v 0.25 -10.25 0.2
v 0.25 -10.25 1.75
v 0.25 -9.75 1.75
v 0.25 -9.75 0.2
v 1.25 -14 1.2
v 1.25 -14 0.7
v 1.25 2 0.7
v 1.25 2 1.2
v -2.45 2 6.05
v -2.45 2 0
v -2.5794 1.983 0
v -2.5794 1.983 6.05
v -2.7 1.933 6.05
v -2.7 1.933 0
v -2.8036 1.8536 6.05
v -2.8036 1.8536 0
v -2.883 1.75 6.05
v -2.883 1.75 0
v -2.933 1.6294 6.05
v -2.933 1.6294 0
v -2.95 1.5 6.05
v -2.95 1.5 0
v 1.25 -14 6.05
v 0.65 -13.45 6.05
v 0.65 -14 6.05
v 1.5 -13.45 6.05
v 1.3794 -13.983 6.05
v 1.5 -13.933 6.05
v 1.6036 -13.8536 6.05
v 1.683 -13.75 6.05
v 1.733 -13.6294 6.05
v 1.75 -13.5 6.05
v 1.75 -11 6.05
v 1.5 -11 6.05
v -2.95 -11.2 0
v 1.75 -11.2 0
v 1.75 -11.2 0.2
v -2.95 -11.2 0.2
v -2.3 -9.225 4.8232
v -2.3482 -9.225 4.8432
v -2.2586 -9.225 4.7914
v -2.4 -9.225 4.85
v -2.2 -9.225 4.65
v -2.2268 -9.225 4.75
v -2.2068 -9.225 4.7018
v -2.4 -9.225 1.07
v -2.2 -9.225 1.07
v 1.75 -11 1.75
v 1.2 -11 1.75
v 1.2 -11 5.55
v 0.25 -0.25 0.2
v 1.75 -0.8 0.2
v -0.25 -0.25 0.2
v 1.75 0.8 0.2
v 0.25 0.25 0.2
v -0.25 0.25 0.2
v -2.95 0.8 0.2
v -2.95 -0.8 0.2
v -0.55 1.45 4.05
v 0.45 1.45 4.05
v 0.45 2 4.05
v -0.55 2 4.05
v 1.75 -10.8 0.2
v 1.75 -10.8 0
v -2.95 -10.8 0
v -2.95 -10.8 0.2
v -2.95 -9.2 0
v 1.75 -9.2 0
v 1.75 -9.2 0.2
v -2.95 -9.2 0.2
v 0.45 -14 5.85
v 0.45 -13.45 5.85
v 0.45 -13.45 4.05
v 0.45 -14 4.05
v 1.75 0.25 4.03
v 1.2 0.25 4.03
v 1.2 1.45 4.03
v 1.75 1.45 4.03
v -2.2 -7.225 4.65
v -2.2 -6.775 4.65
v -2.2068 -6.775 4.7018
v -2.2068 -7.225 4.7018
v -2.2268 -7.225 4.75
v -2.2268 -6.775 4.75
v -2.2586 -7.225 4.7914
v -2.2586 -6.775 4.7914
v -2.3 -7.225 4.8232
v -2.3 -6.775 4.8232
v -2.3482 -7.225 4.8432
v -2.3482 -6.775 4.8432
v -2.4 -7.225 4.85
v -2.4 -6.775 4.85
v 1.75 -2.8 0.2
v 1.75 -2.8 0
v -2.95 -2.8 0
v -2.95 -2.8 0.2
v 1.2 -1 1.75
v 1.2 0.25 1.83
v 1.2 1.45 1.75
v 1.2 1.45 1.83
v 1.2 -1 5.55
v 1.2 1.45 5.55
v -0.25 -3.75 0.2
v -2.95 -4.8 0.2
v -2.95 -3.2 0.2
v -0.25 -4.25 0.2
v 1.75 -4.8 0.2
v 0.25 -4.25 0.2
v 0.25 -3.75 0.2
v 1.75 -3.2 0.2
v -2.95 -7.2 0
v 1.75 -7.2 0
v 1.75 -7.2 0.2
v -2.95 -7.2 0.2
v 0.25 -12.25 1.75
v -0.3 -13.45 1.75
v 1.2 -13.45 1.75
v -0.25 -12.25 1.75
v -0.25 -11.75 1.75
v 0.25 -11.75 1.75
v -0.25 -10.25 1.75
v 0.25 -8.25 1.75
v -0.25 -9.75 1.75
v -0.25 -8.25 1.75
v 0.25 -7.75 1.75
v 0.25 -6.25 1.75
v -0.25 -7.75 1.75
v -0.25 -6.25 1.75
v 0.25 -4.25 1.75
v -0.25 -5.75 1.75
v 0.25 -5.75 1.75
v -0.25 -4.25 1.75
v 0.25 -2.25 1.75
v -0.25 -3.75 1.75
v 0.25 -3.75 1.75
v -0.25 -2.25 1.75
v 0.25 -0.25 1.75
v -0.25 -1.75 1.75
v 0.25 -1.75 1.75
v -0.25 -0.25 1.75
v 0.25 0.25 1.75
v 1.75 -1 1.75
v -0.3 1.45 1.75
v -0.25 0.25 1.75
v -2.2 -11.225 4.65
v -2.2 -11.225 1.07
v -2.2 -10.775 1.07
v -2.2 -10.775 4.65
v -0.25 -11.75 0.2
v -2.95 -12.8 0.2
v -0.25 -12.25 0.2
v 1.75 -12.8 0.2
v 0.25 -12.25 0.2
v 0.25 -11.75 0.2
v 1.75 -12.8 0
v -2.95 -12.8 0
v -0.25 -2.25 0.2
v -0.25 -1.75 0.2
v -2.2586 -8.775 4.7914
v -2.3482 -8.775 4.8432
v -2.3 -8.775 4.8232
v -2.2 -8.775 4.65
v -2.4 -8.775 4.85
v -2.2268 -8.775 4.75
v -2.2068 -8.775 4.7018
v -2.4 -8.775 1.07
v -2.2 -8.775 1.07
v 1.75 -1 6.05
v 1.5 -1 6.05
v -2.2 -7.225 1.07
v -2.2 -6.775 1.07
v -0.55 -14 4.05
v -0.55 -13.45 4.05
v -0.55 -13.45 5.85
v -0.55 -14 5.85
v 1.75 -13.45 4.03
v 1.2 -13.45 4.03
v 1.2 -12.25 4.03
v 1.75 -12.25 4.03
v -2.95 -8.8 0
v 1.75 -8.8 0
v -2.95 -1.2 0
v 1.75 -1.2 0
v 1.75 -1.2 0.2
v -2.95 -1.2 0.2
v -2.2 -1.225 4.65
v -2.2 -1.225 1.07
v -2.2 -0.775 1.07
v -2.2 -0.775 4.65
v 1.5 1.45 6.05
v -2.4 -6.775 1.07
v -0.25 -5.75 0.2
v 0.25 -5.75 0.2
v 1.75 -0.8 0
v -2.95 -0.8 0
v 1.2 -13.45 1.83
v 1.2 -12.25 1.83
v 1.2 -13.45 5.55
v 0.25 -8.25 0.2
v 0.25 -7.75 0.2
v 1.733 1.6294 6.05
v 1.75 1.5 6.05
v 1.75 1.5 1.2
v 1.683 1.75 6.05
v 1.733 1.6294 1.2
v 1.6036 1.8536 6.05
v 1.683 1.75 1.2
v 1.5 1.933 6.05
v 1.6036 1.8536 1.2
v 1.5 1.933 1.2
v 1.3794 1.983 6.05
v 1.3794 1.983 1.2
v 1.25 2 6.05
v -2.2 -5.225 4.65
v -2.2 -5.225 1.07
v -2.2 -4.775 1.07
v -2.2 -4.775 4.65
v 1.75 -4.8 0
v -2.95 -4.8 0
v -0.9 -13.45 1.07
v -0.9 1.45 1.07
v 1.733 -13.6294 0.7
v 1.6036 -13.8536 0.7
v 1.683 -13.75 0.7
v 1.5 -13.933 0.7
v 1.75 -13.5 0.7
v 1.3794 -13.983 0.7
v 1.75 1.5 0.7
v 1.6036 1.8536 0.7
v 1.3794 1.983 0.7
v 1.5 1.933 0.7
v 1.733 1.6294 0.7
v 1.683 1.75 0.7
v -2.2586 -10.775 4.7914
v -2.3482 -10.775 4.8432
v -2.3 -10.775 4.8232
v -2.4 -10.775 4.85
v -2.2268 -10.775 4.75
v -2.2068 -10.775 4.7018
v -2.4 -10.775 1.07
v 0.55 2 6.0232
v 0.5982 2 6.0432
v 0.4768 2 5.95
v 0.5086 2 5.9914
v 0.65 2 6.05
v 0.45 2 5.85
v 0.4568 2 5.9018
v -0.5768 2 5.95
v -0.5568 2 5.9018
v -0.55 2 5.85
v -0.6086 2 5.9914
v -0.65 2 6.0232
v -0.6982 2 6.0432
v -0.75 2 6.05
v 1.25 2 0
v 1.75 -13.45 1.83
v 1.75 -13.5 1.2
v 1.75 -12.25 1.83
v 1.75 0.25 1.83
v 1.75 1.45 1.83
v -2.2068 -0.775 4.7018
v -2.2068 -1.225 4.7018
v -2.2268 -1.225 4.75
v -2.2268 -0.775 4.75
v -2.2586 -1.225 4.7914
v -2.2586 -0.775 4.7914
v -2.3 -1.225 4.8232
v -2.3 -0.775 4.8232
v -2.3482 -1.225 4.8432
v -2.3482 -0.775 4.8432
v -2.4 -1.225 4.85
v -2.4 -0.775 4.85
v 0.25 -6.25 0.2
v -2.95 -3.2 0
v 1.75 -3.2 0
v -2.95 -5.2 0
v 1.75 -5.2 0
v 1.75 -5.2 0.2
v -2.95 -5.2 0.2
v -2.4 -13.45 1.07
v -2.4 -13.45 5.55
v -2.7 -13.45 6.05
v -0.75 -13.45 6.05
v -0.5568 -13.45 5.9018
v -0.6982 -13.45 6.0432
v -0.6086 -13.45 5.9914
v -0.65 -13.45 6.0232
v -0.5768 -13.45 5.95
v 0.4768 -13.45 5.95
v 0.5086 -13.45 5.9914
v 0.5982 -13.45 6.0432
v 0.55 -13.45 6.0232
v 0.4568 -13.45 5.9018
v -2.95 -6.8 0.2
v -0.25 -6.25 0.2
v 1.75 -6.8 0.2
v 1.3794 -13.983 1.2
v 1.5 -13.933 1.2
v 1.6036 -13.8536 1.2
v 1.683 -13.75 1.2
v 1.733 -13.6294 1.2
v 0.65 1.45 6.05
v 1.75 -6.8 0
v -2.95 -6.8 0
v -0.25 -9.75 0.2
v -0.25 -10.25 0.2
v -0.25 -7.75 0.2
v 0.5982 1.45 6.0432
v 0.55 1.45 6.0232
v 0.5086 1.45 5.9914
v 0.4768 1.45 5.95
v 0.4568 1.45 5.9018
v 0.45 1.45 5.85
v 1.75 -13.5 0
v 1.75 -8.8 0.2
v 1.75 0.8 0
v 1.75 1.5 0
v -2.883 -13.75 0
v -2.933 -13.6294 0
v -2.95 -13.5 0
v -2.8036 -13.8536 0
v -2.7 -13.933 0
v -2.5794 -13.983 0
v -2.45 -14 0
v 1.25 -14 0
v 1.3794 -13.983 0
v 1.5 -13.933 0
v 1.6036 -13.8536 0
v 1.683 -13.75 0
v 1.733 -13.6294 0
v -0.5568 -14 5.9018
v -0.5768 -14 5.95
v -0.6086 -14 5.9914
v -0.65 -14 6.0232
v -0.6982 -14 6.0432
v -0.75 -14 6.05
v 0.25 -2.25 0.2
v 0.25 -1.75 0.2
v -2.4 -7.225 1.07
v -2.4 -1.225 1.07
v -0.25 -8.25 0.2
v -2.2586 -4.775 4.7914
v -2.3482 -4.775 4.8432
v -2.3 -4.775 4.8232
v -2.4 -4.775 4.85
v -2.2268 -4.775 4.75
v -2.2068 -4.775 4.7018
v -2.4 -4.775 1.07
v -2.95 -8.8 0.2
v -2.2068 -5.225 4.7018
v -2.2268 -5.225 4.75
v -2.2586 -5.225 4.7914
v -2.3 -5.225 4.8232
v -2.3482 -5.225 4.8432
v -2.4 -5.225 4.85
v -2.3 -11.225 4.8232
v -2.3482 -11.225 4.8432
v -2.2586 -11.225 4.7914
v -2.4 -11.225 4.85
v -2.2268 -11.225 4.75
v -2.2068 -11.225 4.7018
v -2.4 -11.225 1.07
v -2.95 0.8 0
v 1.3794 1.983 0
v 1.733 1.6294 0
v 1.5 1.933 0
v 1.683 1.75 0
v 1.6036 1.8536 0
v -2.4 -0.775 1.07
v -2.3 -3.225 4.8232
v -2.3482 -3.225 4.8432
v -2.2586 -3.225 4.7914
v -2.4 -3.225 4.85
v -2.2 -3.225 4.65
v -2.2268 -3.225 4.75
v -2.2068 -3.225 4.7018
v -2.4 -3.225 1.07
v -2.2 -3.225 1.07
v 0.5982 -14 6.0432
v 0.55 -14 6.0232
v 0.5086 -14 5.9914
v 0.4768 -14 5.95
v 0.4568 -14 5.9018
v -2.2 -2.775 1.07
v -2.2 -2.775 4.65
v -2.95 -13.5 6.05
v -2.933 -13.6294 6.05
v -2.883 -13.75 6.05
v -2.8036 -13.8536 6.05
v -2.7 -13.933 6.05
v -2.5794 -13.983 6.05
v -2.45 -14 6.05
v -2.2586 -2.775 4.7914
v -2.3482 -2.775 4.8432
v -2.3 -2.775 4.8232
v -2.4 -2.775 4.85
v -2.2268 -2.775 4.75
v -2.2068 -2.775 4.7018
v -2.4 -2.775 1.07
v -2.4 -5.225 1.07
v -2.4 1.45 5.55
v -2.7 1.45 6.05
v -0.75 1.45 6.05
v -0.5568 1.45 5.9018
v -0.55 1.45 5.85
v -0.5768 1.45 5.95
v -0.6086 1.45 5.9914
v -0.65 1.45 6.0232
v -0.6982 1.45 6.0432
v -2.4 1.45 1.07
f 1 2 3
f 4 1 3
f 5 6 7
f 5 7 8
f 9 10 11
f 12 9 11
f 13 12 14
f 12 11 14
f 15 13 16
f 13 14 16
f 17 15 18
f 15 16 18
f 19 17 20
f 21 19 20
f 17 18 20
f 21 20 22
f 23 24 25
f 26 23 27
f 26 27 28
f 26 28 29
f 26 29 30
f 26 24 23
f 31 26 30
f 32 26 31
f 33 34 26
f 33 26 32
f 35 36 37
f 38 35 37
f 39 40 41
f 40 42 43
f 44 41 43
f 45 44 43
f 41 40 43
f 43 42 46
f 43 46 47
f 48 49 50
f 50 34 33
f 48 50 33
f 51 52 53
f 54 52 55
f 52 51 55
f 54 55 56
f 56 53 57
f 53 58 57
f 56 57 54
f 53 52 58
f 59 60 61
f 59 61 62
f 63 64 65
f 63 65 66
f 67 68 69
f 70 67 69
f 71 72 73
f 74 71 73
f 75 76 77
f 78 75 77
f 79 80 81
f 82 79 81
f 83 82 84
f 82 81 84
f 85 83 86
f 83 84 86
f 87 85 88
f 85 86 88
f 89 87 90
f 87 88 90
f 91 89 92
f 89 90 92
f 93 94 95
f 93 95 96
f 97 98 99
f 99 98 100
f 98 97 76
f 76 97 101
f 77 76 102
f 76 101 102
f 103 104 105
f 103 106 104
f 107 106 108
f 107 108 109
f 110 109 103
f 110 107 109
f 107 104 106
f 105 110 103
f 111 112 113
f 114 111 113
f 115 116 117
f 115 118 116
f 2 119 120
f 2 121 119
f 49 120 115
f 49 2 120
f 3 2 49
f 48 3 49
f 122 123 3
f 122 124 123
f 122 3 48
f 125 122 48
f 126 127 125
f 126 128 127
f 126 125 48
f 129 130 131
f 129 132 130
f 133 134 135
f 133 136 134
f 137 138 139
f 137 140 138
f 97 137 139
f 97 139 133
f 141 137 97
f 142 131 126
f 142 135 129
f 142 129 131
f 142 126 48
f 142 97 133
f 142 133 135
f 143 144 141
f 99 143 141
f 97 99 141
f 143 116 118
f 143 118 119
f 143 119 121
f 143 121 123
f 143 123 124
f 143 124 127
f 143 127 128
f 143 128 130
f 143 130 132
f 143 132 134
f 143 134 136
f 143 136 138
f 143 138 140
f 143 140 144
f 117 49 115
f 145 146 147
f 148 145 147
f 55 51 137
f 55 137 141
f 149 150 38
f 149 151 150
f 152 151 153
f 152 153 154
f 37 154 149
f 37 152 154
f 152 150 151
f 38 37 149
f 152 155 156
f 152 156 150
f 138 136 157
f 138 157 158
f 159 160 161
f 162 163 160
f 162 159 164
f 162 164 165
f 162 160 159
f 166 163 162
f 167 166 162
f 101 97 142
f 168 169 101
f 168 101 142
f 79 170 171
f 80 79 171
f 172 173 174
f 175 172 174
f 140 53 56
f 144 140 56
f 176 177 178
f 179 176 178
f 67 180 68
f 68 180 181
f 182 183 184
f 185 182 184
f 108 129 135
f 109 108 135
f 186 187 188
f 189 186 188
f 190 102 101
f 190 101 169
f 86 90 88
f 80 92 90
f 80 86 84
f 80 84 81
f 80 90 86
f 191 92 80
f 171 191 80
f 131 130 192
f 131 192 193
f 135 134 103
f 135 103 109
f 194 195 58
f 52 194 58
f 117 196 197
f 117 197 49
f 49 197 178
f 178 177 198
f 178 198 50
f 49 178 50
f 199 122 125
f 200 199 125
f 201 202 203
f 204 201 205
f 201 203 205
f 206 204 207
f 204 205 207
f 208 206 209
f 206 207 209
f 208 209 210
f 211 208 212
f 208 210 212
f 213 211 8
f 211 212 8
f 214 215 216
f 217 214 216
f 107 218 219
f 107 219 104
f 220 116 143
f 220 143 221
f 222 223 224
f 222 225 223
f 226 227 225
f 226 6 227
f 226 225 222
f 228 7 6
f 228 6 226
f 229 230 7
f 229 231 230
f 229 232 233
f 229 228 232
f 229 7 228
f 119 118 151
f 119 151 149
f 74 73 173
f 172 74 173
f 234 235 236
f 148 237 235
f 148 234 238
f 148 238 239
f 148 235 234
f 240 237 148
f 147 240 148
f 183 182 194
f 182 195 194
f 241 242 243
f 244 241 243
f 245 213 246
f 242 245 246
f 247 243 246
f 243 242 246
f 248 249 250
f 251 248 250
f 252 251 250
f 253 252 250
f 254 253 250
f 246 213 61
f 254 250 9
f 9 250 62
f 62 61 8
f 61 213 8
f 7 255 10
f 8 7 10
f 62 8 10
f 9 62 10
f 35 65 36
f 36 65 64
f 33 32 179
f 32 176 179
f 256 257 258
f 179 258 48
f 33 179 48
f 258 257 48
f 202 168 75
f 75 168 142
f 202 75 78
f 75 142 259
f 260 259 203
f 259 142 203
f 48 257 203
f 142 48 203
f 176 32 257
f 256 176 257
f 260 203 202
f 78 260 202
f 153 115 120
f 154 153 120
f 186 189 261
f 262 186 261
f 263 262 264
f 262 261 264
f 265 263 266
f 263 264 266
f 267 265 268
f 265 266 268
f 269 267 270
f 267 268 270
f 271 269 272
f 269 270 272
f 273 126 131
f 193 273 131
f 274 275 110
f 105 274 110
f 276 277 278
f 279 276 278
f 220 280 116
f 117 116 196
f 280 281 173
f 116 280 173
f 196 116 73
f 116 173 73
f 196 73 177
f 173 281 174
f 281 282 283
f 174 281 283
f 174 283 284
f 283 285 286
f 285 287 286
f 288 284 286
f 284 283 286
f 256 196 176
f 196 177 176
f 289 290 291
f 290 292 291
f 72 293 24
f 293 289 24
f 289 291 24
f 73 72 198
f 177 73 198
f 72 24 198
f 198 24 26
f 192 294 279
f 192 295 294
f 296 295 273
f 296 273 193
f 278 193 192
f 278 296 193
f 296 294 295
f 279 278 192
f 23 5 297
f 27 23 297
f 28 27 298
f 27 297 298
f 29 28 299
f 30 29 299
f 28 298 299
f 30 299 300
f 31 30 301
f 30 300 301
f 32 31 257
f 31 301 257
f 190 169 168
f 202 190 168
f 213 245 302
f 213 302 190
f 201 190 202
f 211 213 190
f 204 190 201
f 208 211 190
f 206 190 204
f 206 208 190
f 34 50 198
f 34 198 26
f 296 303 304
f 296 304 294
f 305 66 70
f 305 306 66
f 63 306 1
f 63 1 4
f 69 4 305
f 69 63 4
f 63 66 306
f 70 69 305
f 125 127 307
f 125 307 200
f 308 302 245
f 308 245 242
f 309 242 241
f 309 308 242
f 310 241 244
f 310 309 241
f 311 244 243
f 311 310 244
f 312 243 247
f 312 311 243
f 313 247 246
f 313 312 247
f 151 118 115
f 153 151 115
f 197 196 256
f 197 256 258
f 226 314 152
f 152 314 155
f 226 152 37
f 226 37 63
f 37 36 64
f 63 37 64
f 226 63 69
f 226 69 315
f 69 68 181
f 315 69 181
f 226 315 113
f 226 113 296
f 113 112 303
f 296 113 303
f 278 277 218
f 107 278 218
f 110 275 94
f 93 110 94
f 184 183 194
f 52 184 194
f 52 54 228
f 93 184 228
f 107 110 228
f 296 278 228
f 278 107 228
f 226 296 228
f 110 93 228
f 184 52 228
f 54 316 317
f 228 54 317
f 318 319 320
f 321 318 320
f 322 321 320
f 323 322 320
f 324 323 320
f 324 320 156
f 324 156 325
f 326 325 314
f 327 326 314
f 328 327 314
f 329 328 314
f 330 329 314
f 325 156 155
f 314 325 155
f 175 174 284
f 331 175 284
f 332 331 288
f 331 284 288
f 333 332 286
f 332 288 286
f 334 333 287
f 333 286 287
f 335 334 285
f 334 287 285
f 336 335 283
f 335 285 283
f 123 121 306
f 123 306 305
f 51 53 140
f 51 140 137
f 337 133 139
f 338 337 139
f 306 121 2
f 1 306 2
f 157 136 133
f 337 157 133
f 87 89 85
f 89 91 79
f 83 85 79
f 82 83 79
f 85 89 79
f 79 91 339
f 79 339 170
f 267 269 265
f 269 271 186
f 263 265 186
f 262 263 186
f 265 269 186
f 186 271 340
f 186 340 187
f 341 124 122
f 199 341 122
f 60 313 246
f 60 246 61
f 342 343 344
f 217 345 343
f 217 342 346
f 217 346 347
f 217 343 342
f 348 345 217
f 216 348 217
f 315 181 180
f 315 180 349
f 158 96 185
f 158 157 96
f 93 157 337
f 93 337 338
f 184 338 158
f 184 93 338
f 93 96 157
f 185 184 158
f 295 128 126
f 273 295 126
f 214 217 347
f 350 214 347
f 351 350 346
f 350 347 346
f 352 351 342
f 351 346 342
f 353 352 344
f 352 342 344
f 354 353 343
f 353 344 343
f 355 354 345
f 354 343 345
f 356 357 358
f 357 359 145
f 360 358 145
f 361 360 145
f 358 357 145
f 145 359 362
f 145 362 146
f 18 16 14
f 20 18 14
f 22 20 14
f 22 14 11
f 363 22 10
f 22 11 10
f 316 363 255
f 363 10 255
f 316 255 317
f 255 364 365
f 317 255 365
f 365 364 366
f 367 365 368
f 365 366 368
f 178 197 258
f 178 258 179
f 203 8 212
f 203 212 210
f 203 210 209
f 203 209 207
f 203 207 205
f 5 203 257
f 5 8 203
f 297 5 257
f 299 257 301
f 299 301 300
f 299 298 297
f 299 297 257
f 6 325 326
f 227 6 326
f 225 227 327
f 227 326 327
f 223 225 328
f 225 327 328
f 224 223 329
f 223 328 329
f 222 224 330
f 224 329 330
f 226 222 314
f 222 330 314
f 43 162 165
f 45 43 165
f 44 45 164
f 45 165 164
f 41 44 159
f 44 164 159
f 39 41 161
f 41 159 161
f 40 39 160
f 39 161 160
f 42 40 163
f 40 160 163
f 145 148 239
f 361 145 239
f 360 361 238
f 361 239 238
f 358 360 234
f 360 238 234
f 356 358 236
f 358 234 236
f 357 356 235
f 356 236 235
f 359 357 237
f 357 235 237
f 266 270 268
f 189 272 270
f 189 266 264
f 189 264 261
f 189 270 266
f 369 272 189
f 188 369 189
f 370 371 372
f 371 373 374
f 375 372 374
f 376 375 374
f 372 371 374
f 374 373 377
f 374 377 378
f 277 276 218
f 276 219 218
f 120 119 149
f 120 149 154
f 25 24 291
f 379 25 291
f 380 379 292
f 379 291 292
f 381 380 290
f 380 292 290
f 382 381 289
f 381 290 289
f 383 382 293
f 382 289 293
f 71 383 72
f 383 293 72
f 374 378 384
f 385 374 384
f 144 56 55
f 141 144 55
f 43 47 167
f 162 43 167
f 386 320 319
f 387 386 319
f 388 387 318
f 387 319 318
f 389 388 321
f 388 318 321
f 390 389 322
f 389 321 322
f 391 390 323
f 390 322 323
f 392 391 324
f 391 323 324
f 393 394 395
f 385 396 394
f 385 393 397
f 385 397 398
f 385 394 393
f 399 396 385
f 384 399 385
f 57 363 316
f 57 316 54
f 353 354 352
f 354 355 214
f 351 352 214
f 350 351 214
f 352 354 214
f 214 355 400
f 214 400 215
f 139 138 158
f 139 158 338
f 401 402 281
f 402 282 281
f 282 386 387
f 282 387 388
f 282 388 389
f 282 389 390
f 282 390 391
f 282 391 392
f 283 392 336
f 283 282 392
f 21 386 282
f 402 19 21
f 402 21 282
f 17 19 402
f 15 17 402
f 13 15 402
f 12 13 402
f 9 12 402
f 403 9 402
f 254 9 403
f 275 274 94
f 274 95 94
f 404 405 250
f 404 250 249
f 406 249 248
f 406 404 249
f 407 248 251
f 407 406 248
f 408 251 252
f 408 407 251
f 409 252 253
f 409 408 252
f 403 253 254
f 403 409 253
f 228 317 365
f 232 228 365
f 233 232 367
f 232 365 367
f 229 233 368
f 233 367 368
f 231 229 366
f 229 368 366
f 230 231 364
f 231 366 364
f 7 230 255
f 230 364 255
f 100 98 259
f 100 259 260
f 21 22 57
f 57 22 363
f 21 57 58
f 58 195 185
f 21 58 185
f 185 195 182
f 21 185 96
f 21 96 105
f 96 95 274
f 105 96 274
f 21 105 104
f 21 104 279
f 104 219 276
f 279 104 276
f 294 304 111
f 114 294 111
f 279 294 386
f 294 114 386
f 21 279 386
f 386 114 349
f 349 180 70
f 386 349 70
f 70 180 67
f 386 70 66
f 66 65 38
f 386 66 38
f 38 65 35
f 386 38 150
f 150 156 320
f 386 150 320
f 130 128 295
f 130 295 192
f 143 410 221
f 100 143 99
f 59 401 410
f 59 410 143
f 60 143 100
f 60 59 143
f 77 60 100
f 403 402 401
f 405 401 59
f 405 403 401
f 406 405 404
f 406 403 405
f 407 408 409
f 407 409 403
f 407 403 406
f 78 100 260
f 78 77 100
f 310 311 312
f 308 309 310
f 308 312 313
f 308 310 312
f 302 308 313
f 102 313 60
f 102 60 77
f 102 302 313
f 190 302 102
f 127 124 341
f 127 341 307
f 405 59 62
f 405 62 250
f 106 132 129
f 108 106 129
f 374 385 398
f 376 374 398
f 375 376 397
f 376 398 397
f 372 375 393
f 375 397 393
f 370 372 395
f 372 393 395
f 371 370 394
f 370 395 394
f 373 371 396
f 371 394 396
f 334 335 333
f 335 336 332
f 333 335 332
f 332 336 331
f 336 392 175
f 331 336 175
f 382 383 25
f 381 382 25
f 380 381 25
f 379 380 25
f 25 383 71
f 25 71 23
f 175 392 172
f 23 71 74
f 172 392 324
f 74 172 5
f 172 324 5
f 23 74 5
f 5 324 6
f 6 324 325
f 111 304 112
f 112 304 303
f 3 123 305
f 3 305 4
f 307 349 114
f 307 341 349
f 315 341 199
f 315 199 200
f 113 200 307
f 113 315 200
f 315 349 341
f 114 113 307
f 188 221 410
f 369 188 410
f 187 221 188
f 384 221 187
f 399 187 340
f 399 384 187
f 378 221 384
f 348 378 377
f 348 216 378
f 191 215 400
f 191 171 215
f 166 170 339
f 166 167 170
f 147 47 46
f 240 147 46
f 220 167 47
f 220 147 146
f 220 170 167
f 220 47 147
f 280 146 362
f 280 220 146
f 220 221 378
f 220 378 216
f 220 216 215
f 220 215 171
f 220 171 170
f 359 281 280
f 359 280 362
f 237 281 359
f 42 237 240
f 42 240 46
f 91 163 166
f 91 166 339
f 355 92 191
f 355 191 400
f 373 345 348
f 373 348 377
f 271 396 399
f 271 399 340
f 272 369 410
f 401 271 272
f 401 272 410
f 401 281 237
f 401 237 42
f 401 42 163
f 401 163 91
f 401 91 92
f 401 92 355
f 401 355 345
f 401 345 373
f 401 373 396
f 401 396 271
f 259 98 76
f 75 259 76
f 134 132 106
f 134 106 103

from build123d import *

# Parameters (mm, degrees)
PAD_DEPTH              = 6.05
SKETCH_W               = 3.6
SKETCH_H               = 14.9
POCKET_DEPTH           = 4.3
POCKET001_DEPTH        = 1.45
POCKET001_DEPTH_BACK   = 13.45
SKETCH004_W            = 0.55
SKETCH004_H            = 10
POCKET002_DEPTH        = 4.3
SKETCH005_W            = 1.2
SKETCH005_H            = 2.2
POCKET003_DEPTH        = 1.751
POCKET004_DEPTH        = 2.001
POCKET004_DEPTH_BACK   = 14.001
SKETCH007_W            = 0.5
SKETCH007_H            = 0.5
POCKET005_DEPTH        = 2.001
POCKET005_DEPTH_BACK   = 14.001
SKETCH008_W            = 0.2
SKETCH008_H            = 0.45
PAD001_DEPTH           = 4.85
LINEARPATTERN_COUNT    = 6
LINEARPATTERN_PITCH    = 2
POCKET006_DEPTH        = 12
SKETCH010_W            = 1.6
SKETCH010_H            = 0.2
POCKET007_DEPTH        = 2.951
POCKET007_DEPTH_BACK   = 1.751
LINEARPATTERN001_COUNT = 7
LINEARPATTERN001_PITCH = 2
SKETCH011_W            = 0.5
SKETCH011_H            = 0.5
POCKET008_DEPTH        = 0.001
POCKET008_DEPTH_BACK   = 6.051
LINEARPATTERN002_COUNT = 7
LINEARPATTERN002_PITCH = 2


with BuildPart() as part:
    # Sketch001 → Pad (new body)
    with BuildSketch(Plane.XY):
        with BuildLine():
            Line((-2.95, 1.5), (-2.95, -13.5))
            ThreePointArc((-2.95, -13.5), (-2.803553, -13.853553), (-2.45, -14))
            Line((-2.45, -14), (1.25, -14))
            ThreePointArc((1.25, -14), (1.603553, -13.853553), (1.75, -13.5))
            Line((1.75, -13.5), (1.75, 1.5))
            ThreePointArc((1.75, 1.5), (1.603553, 1.853553), (1.25, 2))
            Line((1.25, 2), (-2.45, 2))
            ThreePointArc((-2.45, 2), (-2.803553, 1.853553), (-2.95, 1.5))
        make_face()
    extrude(amount=PAD_DEPTH)

    # Sketch (on DatumPlane) → Pocket (cut)
    with BuildSketch(Plane.XY.offset(6.05)):
        with Locations((-0.6, -6)):
            Rectangle(SKETCH_W, SKETCH_H)
    extrude(amount=-POCKET_DEPTH, mode=Mode.SUBTRACT)

    # Sketch003 → Pocket001 (cut, two sides)
    with BuildSketch(Plane.XZ) as pocket001_sk:
        Polygon((1.5, 6.05), (1.2, 6.05), (1.2, 5.55), align=None)
        Polygon((-2.7, 6.05), (-2.4, 5.55), (-2.4, 6.05), align=None)
        Polygon((-2.4, 1.75), (-0.3, 1.75), (-0.9, 1.07), (-2.4, 1.07), align=None)
    extrude(amount=-POCKET001_DEPTH, mode=Mode.SUBTRACT)
    extrude(pocket001_sk.sketch, amount=POCKET001_DEPTH_BACK, mode=Mode.SUBTRACT)

    # Sketch004 (on DatumPlane) → Pocket002 (cut)
    with BuildSketch(Plane.XY.offset(6.05)):
        with Locations((1.475, -6)):
            Rectangle(SKETCH004_W, SKETCH004_H)
    extrude(amount=-POCKET002_DEPTH, mode=Mode.SUBTRACT)

    # Sketch005 → Pocket003 (cut, through all)
    with BuildSketch(Plane.YZ):
        with Locations((0.85, 2.93)):
            Rectangle(SKETCH005_W, SKETCH005_H)
        with Locations((-12.85, 2.93)):
            Rectangle(SKETCH005_W, SKETCH005_H)
    extrude(amount=POCKET003_DEPTH, mode=Mode.SUBTRACT)

    # Sketch006 → Pocket004 (cut, two sides)
    with BuildSketch(Plane.XZ) as pocket004_sk:
        with BuildLine():
            Line((0.45, 5.85), (0.45, 4.05))
            Line((0.45, 4.05), (-0.55, 4.05))
            Line((-0.55, 4.05), (-0.55, 5.85))
            ThreePointArc((-0.55, 5.85), (-0.608579, 5.991421), (-0.75, 6.05))
            Line((0.65, 6.05), (-0.75, 6.05))
            ThreePointArc((0.65, 6.05), (0.508579, 5.991421), (0.45, 5.85))
        make_face()
    extrude(amount=-POCKET004_DEPTH, mode=Mode.SUBTRACT)
    extrude(pocket004_sk.sketch, amount=POCKET004_DEPTH_BACK, mode=Mode.SUBTRACT)

    # Sketch007 → Pocket005 (cut, two sides)
    with BuildSketch(Plane.XZ) as pocket005_sk:
        with Locations((1.5, 0.95)):
            Rectangle(SKETCH007_W, SKETCH007_H)
    extrude(amount=-POCKET005_DEPTH, mode=Mode.SUBTRACT)
    extrude(pocket005_sk.sketch, amount=POCKET005_DEPTH_BACK, mode=Mode.SUBTRACT)

    # Sketch008 → Pad001 (join)
    with BuildSketch(Plane.XY):
        with Locations((-2.3, -1)):
            Rectangle(SKETCH008_W, SKETCH008_H)
    pad001 = extrude(amount=PAD001_DEPTH)

    # LinearPattern: Pad001 ×6
    with Locations(*[(0, -i * LINEARPATTERN_PITCH, 0) for i in range(1, LINEARPATTERN_COUNT)]):
        add(pad001)

    # Sketch009 → Pocket006 (cut)
    with BuildSketch(Plane.XZ):
        with BuildLine():
            Line((-2.4, 4.95), (-2.2, 4.95))
            Line((-2.2, 4.95), (-2.2, 4.65))
            ThreePointArc((-2.2, 4.65), (-2.258579, 4.791421), (-2.4, 4.85))
            Line((-2.4, 4.85), (-2.4, 4.95))
        make_face()
    extrude(amount=POCKET006_DEPTH, mode=Mode.SUBTRACT)

    # Sketch010 → Pocket007 (cut, two sides)
    with BuildSketch(Plane.YZ) as pocket007_sk:
        with Locations((0, 0.1)):
            Rectangle(SKETCH010_W, SKETCH010_H)
    pocket007 = extrude(amount=-POCKET007_DEPTH, mode=Mode.SUBTRACT) + extrude(pocket007_sk.sketch, amount=POCKET007_DEPTH_BACK, mode=Mode.SUBTRACT)

    # LinearPattern001: Pocket007 ×7
    with Locations(*[(0, -i * LINEARPATTERN001_PITCH, 0) for i in range(1, LINEARPATTERN001_COUNT)]):
        add(pocket007, mode=Mode.SUBTRACT)

    # Sketch011 → Pocket008 (cut, two sides)
    with BuildSketch(Plane.XY) as pocket008_sk:
        Rectangle(SKETCH011_W, SKETCH011_H)
    pocket008 = extrude(amount=-POCKET008_DEPTH, mode=Mode.SUBTRACT) + extrude(pocket008_sk.sketch, amount=POCKET008_DEPTH_BACK, mode=Mode.SUBTRACT)

    # LinearPattern002: Pocket008 ×7
    with Locations(*[(0, -i * LINEARPATTERN002_PITCH, 0) for i in range(1, LINEARPATTERN002_COUNT)]):
        add(pocket008, mode=Mode.SUBTRACT)


solid = part.part
